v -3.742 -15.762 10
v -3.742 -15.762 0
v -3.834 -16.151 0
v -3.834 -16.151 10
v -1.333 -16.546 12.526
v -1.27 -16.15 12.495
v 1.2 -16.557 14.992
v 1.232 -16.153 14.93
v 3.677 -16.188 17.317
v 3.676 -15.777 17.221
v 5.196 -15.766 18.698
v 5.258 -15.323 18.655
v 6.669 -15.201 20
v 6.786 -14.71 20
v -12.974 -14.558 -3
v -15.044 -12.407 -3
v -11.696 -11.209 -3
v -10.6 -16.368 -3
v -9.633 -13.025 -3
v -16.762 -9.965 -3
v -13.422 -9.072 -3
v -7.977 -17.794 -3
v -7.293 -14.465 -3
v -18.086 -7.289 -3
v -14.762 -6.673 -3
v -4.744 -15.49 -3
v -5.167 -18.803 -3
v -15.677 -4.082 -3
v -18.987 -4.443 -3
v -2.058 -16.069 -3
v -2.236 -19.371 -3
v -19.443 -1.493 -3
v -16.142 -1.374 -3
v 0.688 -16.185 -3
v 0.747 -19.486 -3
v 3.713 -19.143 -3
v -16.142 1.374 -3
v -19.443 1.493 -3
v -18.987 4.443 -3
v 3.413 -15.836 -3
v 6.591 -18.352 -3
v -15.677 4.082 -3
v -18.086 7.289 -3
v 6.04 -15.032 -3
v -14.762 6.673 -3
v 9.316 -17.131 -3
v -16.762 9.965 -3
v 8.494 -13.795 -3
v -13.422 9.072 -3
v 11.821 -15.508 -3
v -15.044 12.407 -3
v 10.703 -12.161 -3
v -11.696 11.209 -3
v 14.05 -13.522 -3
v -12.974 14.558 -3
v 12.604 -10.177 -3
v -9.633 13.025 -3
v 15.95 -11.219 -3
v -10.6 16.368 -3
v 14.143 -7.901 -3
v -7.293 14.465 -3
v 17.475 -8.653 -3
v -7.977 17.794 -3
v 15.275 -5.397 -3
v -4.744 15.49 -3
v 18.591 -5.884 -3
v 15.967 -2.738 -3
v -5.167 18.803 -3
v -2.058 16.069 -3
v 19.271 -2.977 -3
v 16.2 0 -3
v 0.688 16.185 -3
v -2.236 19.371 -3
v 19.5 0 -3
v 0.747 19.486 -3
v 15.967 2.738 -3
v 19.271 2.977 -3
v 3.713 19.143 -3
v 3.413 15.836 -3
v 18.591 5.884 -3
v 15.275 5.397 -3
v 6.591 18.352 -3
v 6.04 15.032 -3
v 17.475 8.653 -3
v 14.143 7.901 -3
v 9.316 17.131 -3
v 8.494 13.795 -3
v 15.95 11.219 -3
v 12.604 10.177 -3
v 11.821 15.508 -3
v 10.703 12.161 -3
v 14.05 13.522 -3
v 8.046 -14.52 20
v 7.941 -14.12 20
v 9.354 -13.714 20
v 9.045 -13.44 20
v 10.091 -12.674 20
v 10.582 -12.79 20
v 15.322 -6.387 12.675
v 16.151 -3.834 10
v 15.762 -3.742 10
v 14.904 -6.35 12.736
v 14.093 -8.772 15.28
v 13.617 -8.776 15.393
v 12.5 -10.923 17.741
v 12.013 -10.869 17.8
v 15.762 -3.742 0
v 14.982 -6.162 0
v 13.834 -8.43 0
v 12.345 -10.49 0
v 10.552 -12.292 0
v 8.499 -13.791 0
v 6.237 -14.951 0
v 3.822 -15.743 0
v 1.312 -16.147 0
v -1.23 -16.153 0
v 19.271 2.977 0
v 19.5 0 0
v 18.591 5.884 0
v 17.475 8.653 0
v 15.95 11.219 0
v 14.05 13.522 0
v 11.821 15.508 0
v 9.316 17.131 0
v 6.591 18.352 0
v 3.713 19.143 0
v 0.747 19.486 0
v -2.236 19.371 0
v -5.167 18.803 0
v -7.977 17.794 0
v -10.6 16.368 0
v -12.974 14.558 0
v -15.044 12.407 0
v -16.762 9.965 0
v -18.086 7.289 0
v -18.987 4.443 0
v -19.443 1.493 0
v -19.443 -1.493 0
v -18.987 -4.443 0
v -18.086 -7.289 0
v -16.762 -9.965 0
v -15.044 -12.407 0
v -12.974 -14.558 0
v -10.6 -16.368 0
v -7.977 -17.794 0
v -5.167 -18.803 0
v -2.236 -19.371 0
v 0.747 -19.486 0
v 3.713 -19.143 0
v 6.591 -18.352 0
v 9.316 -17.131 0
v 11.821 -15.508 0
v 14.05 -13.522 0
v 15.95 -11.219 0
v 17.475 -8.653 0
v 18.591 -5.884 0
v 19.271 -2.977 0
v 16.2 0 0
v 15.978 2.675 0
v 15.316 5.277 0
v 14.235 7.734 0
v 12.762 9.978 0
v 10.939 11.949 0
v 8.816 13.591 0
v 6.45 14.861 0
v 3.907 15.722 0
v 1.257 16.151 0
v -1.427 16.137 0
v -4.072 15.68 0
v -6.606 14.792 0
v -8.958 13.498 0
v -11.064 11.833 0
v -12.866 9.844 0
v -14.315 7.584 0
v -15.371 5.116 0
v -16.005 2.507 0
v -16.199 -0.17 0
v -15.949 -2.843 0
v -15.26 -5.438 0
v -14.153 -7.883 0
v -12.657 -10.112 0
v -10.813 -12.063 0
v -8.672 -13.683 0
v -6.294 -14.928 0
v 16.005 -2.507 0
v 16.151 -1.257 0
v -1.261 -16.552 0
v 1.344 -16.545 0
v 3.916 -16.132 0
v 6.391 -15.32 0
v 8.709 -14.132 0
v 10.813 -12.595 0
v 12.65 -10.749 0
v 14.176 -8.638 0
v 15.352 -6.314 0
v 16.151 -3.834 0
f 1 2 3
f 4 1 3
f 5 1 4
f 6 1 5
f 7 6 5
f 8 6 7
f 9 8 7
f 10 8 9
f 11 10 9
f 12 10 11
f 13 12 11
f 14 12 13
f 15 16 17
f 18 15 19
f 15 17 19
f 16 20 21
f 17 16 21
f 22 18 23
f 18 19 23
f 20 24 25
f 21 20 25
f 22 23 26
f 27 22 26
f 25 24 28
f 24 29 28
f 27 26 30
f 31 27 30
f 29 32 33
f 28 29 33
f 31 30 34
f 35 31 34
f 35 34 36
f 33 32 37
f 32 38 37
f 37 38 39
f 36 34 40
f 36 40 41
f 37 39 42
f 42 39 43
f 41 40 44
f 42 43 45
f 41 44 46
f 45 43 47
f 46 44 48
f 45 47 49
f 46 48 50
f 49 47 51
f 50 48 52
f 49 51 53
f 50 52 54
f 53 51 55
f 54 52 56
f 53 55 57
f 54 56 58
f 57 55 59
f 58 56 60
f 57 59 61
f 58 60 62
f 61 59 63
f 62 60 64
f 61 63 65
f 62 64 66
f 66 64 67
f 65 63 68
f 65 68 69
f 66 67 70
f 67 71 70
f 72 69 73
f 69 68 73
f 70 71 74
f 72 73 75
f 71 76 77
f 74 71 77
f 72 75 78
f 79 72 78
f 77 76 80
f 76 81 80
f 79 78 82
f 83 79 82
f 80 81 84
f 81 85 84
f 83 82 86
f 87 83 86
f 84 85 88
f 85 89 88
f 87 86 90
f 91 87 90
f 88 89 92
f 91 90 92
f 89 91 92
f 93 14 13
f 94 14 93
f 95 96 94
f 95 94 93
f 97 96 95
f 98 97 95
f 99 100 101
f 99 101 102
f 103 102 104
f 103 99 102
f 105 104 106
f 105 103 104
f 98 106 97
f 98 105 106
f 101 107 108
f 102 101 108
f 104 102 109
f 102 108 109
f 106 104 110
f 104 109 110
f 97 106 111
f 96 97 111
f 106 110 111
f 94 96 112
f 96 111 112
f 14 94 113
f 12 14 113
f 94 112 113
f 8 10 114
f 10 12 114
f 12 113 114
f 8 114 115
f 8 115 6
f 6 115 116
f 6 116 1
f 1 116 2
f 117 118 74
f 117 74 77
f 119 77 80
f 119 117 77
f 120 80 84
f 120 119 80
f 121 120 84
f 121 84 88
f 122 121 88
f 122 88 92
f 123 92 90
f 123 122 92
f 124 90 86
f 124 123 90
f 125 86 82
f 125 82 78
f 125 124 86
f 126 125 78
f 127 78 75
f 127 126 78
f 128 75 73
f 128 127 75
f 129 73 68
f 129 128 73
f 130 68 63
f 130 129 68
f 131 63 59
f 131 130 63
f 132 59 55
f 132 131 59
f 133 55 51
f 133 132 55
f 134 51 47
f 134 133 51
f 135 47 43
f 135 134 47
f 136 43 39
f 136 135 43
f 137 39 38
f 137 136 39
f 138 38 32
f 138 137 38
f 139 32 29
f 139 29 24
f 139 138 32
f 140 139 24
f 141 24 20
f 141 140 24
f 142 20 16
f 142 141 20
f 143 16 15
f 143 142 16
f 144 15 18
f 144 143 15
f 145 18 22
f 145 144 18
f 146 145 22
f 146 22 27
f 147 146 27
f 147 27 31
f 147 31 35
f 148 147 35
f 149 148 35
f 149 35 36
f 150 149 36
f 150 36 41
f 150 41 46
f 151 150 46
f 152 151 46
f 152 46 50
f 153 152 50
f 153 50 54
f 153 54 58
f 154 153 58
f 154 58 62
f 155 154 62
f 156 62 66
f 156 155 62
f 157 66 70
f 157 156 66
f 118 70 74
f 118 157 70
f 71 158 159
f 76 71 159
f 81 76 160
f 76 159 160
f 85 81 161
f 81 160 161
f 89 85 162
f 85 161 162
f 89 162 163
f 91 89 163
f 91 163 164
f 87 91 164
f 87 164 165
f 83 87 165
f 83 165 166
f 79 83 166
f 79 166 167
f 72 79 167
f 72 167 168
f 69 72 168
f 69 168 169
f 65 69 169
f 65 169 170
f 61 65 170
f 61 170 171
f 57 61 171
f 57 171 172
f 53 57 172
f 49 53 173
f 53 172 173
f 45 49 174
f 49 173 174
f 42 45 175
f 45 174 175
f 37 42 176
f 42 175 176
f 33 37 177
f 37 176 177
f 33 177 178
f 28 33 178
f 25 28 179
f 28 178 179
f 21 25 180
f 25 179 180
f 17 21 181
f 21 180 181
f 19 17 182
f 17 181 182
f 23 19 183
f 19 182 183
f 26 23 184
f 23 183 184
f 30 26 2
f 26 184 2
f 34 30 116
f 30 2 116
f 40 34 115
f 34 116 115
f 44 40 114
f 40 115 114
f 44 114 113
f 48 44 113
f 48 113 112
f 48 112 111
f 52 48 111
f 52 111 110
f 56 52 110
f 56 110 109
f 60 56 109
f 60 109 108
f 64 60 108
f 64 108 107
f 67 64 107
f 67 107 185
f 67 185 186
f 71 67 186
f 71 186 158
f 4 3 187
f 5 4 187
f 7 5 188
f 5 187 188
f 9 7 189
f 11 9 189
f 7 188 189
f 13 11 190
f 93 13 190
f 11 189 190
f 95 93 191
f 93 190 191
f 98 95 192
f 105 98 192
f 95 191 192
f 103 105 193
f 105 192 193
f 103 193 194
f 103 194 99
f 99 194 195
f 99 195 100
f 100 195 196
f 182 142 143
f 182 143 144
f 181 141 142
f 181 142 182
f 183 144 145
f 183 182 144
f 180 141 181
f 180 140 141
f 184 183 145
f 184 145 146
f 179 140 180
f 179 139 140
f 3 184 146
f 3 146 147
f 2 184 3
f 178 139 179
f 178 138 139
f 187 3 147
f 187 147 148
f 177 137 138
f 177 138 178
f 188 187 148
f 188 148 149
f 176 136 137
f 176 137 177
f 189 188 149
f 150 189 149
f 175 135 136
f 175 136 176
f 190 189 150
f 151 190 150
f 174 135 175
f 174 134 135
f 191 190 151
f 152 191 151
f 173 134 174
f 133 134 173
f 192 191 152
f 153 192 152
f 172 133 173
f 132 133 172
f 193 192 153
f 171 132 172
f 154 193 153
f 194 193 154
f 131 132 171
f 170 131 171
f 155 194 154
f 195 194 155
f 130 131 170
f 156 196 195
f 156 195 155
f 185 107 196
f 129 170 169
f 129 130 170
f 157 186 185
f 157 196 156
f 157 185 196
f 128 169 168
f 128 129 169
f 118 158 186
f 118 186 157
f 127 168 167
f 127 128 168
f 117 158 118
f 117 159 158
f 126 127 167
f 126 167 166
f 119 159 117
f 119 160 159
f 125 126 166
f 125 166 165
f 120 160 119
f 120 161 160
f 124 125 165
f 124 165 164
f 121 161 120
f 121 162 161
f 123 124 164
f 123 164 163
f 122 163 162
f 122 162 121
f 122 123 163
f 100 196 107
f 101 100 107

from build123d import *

# Parameters (mm, degrees)
F1_DEPTH    = 20
F2_R        = 19.5
F2_R_2      = 16.2
F3_DEPTH    = 3
F4_T1_DEPTH = 51.8336597593
F4_T3_DEPTH = 51.8336597593


# Not quite as in the source:
# - a fillet or chamfer that OpenCascade refuses, or shapes differently, is made with other operations: its cross-section is extruded or revolved along the edge and cut away or added


with BuildPart() as f1:
    # F0 (on Top) → F1 (new body)
    with BuildSketch(Plane.XY):
        with BuildLine():
            ThreePointArc((15.7618937877, -3.7420187366), (8.4993351577, -13.7913488056), (-3.7420187366, -15.7618937877))
            Line((-3.7420187366, -15.7618937877), (-3.8344142609, -16.1510763504))
            ThreePointArc((-3.8344142609, -16.1510763504), (8.709195285, -14.1318759366), (16.1510763504, -3.8344142609))
            Line((16.1510763504, -3.8344142609), (15.7618937877, -3.7420187366))
        make_face()
    extrude(amount=F1_DEPTH)

    # F2 (on Top) → F3 (join)
    with BuildSketch(Plane.XY):
        Circle(F2_R)
        Circle(F2_R_2, mode=Mode.SUBTRACT)
    extrude(amount=-F3_DEPTH)

    # F4: chamfer of 10 on 2 edges, made by hand

    # F4_s2 → F4_t1 (cut)
    with BuildSketch(Plane(origin=(41.1724307405, -9.7747142149, 0), x_dir=(0, 0, 1), z_dir=(-0.9729564066, 0.2309888109, 0))):
        Polygon((10, 0), (20, -10), (20, 0), align=None)
    extrude(amount=F4_T1_DEPTH, mode=Mode.SUBTRACT)

    # F4_s4 → F4_t3 (cut)
    with BuildSketch(Plane(origin=(2.1982812174, 9.2594606024, 0), x_dir=(0, 0, 1), z_dir=(-0.2309888109, -0.9729564066, 0))):
        Polygon((10, 0), (20, -10), (20, 0), align=None)
    extrude(amount=F4_T3_DEPTH, mode=Mode.SUBTRACT)


solid = f1.part
